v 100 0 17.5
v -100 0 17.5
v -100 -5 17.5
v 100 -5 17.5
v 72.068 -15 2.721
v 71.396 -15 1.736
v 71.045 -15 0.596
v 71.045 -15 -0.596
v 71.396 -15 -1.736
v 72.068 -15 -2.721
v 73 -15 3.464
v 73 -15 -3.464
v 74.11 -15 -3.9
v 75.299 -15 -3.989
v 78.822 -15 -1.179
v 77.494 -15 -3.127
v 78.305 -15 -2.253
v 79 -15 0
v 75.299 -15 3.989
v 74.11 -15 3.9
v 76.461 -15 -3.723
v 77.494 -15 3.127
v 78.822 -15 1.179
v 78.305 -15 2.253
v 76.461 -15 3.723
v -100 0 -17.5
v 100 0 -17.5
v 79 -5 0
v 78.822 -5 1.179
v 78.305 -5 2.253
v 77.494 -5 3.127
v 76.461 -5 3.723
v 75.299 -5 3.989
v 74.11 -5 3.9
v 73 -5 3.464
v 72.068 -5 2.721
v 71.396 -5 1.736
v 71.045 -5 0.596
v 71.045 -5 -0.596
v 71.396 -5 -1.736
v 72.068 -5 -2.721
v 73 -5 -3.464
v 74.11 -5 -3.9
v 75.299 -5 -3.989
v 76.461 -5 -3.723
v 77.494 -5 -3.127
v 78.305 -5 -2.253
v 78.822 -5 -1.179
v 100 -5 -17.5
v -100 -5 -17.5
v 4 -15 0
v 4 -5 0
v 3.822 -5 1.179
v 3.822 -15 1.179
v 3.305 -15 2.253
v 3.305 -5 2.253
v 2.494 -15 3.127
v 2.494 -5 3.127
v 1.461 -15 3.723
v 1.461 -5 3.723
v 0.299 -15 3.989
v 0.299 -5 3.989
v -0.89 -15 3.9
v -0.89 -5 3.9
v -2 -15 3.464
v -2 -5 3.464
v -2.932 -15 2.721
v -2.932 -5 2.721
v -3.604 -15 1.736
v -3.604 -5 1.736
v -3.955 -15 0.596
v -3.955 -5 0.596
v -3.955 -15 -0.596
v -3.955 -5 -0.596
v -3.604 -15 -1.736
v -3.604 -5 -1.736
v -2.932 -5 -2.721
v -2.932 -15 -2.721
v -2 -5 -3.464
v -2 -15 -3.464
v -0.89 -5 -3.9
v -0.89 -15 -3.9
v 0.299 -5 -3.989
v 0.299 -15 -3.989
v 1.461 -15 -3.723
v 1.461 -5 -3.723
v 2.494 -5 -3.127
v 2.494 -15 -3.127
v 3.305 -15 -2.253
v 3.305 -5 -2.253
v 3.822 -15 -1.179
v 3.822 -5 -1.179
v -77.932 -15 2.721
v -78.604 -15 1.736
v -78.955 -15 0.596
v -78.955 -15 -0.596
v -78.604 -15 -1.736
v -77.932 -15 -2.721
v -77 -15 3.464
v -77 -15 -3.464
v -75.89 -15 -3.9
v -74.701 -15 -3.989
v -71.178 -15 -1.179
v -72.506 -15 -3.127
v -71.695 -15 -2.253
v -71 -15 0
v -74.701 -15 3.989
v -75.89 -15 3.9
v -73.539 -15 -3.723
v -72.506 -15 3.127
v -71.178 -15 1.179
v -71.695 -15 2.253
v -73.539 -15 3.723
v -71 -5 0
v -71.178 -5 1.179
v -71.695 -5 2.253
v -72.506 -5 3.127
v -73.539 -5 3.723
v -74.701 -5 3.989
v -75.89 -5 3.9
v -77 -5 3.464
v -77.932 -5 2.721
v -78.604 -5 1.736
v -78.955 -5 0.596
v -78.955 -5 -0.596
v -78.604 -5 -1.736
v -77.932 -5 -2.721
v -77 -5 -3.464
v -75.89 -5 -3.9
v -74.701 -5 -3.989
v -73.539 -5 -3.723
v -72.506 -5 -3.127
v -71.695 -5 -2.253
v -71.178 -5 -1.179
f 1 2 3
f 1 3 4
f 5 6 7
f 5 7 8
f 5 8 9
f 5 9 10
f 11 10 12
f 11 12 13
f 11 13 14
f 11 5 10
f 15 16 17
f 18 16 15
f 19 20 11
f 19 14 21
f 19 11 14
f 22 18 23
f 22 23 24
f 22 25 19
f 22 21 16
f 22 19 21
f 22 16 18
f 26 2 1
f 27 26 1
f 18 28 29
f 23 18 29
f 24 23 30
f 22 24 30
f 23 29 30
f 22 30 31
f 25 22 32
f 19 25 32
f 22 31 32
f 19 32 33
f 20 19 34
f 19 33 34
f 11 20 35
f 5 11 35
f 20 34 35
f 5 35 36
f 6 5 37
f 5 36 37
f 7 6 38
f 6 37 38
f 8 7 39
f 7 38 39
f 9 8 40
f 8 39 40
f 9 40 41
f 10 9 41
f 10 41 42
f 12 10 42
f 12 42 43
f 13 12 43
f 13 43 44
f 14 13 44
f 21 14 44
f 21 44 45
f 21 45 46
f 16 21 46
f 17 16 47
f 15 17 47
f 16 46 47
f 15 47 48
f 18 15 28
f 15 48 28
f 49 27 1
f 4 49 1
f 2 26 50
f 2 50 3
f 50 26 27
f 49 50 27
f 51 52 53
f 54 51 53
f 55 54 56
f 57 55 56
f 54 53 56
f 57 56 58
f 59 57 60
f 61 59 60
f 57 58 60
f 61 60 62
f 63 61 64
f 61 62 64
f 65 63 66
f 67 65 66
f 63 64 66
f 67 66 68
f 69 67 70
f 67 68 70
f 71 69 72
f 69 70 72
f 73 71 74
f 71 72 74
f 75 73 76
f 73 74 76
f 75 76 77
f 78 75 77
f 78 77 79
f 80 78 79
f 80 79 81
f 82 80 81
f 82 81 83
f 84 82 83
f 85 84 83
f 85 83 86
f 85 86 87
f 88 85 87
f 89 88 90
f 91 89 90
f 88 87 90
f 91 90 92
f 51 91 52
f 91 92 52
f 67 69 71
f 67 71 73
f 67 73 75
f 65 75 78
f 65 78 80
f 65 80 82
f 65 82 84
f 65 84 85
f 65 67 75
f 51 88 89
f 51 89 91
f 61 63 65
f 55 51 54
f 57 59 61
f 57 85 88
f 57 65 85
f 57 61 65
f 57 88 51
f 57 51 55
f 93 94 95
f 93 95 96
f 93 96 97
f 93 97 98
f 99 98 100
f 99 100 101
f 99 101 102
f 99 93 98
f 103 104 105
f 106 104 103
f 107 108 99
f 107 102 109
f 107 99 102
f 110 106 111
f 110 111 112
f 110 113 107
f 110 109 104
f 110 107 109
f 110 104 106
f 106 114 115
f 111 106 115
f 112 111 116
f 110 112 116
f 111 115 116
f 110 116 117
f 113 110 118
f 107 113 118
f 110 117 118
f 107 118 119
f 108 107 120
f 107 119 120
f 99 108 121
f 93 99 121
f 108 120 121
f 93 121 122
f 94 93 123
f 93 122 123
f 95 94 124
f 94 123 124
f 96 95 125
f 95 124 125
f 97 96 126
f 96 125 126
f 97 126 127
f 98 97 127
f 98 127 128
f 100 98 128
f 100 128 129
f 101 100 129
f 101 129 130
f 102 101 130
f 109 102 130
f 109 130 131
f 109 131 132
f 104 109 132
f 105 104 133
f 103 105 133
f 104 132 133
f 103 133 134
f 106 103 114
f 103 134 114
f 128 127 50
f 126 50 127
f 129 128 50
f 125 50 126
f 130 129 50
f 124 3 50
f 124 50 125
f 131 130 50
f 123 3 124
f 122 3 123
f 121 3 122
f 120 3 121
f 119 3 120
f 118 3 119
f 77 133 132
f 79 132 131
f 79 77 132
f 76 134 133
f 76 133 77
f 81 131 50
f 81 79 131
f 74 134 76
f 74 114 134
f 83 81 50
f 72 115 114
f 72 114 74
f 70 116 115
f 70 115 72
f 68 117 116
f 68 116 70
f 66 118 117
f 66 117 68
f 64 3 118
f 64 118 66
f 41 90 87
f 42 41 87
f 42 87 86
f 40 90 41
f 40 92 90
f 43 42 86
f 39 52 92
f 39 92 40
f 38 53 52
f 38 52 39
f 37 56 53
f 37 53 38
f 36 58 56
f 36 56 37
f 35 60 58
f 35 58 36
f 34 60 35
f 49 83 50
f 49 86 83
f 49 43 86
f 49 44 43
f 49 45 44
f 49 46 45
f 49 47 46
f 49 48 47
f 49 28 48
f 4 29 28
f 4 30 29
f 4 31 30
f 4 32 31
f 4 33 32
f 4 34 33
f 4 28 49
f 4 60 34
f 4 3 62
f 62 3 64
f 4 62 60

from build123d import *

# Parameters (mm, degrees)
F0_W     = 200
F0_H     = 35
F1_DEPTH = 5
F2_R     = 4
F3_DEPTH = 10


with BuildPart() as f1:
    # F0 (on Front) → F1 (new body)
    with BuildSketch(Plane.XZ):
        Rectangle(F0_W, F0_H)
    extrude(amount=F1_DEPTH)

    # F2 (on face) → F3 (join)
    with BuildSketch(Plane.XZ.offset(5)):
        with Locations((-75, 0)):
            Circle(F2_R)
        Circle(F2_R)
        with Locations((75, 0)):
            Circle(F2_R)
    extrude(amount=F3_DEPTH)


solid = f1.part
